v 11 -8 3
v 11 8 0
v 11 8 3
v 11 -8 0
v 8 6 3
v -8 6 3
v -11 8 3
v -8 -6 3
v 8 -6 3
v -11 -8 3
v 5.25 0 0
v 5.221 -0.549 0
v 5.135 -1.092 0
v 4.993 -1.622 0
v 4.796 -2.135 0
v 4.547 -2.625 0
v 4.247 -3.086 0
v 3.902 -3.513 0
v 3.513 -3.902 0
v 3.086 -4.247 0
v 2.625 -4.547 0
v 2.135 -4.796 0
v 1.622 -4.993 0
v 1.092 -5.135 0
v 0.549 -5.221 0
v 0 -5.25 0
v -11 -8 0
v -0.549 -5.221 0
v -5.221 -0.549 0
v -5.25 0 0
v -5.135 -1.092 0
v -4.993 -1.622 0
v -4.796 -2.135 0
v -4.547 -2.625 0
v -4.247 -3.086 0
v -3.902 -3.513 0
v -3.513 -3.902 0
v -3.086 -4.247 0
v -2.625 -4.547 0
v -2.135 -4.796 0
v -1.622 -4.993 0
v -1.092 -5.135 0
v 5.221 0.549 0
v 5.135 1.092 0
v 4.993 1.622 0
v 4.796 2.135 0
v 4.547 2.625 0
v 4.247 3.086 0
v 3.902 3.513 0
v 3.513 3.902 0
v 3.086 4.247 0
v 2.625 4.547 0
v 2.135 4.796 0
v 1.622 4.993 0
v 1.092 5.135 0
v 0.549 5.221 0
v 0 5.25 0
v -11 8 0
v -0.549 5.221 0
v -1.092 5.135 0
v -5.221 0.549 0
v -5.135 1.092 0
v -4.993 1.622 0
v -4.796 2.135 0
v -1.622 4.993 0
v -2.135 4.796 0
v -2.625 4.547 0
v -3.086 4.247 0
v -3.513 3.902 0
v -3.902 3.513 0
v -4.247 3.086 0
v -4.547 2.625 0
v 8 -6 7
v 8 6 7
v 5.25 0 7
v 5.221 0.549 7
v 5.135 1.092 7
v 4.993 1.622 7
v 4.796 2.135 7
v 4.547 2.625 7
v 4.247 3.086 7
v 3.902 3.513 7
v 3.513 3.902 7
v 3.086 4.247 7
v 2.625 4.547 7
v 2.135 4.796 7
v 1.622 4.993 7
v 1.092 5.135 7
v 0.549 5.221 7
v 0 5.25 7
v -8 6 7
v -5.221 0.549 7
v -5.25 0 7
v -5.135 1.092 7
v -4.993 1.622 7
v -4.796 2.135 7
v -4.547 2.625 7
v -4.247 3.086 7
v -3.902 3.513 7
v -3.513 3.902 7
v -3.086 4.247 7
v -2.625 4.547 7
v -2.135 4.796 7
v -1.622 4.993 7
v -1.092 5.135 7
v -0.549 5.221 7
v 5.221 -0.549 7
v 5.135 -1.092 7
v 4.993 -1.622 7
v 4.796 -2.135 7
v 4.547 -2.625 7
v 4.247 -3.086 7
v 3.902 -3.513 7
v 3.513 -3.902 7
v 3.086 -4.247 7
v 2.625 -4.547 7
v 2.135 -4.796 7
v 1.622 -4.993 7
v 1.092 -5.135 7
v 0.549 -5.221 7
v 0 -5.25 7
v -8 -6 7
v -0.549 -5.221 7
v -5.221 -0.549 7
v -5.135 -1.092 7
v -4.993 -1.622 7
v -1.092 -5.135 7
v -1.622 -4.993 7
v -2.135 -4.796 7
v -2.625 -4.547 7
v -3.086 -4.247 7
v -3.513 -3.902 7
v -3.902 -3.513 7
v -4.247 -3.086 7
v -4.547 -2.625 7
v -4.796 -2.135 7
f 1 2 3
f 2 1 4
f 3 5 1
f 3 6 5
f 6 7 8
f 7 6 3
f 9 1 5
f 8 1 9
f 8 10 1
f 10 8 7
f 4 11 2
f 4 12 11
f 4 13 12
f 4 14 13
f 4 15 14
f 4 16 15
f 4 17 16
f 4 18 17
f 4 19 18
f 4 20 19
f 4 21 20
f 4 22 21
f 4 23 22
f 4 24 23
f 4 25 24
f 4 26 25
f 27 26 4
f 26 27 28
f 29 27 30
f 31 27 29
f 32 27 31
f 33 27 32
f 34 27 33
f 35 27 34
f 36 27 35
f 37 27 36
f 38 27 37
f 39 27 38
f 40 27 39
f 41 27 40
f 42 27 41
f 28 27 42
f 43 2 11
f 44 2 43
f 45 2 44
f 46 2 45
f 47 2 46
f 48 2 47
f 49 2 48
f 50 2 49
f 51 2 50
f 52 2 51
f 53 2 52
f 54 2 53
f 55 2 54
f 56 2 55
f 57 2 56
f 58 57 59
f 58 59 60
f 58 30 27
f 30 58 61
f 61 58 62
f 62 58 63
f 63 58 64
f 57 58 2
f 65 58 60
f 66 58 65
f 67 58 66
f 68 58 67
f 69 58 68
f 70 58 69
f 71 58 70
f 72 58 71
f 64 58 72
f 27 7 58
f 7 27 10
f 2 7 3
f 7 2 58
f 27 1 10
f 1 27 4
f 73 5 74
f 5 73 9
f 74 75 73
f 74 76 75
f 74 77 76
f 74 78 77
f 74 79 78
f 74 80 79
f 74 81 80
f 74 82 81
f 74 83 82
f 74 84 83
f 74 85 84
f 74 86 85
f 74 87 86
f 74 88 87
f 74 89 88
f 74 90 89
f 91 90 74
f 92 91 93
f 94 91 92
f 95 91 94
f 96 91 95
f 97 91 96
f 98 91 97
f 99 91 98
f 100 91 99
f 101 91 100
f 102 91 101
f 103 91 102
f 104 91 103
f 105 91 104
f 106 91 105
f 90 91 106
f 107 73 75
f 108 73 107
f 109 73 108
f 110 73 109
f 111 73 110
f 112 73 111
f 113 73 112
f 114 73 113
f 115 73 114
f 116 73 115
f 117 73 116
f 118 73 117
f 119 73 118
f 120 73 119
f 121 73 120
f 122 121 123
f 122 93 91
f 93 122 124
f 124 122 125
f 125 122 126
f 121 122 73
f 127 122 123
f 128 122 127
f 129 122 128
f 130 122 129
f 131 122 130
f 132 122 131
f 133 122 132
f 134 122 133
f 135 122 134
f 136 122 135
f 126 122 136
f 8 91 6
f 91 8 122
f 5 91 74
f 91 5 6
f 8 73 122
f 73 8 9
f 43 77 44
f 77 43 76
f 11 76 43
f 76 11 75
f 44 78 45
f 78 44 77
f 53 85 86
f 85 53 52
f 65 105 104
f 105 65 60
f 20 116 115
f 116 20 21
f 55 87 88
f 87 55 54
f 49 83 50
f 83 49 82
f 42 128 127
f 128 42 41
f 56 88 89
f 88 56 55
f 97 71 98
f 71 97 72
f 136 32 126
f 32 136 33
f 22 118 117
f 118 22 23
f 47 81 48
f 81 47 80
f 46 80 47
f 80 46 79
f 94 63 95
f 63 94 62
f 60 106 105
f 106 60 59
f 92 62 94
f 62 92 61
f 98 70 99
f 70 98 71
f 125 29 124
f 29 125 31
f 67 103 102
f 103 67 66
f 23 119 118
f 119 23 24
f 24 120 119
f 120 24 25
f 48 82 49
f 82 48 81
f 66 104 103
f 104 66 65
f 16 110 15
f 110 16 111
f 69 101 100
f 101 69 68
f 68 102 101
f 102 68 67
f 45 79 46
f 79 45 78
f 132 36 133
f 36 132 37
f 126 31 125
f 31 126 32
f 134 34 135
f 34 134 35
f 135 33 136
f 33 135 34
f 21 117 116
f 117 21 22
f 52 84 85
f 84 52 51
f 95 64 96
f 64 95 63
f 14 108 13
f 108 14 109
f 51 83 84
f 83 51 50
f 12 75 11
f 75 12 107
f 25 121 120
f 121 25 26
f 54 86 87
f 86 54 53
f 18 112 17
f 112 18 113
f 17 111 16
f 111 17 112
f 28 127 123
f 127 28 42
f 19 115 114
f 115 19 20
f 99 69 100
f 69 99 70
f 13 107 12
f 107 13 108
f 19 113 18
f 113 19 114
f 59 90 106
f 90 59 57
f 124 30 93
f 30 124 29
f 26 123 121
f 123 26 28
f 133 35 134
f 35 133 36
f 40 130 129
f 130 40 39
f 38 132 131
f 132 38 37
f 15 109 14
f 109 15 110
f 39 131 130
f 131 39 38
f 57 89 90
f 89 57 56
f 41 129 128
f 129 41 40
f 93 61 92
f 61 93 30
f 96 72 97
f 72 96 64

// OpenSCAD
// T-slot nut for aluminium extrusion.
$fn = 60;
eps = 0.02;
slot_w = 12;
thread_d = 10.5;
length = 22;
body_w = slot_w + 4;
body_h = 7;
difference() {
    union() {
        translate([-length / 2, -body_w / 2, 0]) cube([length, body_w, 3]);
        translate([-length / 2 + 3, -slot_w / 2, 3]) cube([length - 6, slot_w, body_h - 3]);
    }
    translate([0, 0, -eps]) cylinder(d = thread_d, h = body_h + 2 * eps);
}
